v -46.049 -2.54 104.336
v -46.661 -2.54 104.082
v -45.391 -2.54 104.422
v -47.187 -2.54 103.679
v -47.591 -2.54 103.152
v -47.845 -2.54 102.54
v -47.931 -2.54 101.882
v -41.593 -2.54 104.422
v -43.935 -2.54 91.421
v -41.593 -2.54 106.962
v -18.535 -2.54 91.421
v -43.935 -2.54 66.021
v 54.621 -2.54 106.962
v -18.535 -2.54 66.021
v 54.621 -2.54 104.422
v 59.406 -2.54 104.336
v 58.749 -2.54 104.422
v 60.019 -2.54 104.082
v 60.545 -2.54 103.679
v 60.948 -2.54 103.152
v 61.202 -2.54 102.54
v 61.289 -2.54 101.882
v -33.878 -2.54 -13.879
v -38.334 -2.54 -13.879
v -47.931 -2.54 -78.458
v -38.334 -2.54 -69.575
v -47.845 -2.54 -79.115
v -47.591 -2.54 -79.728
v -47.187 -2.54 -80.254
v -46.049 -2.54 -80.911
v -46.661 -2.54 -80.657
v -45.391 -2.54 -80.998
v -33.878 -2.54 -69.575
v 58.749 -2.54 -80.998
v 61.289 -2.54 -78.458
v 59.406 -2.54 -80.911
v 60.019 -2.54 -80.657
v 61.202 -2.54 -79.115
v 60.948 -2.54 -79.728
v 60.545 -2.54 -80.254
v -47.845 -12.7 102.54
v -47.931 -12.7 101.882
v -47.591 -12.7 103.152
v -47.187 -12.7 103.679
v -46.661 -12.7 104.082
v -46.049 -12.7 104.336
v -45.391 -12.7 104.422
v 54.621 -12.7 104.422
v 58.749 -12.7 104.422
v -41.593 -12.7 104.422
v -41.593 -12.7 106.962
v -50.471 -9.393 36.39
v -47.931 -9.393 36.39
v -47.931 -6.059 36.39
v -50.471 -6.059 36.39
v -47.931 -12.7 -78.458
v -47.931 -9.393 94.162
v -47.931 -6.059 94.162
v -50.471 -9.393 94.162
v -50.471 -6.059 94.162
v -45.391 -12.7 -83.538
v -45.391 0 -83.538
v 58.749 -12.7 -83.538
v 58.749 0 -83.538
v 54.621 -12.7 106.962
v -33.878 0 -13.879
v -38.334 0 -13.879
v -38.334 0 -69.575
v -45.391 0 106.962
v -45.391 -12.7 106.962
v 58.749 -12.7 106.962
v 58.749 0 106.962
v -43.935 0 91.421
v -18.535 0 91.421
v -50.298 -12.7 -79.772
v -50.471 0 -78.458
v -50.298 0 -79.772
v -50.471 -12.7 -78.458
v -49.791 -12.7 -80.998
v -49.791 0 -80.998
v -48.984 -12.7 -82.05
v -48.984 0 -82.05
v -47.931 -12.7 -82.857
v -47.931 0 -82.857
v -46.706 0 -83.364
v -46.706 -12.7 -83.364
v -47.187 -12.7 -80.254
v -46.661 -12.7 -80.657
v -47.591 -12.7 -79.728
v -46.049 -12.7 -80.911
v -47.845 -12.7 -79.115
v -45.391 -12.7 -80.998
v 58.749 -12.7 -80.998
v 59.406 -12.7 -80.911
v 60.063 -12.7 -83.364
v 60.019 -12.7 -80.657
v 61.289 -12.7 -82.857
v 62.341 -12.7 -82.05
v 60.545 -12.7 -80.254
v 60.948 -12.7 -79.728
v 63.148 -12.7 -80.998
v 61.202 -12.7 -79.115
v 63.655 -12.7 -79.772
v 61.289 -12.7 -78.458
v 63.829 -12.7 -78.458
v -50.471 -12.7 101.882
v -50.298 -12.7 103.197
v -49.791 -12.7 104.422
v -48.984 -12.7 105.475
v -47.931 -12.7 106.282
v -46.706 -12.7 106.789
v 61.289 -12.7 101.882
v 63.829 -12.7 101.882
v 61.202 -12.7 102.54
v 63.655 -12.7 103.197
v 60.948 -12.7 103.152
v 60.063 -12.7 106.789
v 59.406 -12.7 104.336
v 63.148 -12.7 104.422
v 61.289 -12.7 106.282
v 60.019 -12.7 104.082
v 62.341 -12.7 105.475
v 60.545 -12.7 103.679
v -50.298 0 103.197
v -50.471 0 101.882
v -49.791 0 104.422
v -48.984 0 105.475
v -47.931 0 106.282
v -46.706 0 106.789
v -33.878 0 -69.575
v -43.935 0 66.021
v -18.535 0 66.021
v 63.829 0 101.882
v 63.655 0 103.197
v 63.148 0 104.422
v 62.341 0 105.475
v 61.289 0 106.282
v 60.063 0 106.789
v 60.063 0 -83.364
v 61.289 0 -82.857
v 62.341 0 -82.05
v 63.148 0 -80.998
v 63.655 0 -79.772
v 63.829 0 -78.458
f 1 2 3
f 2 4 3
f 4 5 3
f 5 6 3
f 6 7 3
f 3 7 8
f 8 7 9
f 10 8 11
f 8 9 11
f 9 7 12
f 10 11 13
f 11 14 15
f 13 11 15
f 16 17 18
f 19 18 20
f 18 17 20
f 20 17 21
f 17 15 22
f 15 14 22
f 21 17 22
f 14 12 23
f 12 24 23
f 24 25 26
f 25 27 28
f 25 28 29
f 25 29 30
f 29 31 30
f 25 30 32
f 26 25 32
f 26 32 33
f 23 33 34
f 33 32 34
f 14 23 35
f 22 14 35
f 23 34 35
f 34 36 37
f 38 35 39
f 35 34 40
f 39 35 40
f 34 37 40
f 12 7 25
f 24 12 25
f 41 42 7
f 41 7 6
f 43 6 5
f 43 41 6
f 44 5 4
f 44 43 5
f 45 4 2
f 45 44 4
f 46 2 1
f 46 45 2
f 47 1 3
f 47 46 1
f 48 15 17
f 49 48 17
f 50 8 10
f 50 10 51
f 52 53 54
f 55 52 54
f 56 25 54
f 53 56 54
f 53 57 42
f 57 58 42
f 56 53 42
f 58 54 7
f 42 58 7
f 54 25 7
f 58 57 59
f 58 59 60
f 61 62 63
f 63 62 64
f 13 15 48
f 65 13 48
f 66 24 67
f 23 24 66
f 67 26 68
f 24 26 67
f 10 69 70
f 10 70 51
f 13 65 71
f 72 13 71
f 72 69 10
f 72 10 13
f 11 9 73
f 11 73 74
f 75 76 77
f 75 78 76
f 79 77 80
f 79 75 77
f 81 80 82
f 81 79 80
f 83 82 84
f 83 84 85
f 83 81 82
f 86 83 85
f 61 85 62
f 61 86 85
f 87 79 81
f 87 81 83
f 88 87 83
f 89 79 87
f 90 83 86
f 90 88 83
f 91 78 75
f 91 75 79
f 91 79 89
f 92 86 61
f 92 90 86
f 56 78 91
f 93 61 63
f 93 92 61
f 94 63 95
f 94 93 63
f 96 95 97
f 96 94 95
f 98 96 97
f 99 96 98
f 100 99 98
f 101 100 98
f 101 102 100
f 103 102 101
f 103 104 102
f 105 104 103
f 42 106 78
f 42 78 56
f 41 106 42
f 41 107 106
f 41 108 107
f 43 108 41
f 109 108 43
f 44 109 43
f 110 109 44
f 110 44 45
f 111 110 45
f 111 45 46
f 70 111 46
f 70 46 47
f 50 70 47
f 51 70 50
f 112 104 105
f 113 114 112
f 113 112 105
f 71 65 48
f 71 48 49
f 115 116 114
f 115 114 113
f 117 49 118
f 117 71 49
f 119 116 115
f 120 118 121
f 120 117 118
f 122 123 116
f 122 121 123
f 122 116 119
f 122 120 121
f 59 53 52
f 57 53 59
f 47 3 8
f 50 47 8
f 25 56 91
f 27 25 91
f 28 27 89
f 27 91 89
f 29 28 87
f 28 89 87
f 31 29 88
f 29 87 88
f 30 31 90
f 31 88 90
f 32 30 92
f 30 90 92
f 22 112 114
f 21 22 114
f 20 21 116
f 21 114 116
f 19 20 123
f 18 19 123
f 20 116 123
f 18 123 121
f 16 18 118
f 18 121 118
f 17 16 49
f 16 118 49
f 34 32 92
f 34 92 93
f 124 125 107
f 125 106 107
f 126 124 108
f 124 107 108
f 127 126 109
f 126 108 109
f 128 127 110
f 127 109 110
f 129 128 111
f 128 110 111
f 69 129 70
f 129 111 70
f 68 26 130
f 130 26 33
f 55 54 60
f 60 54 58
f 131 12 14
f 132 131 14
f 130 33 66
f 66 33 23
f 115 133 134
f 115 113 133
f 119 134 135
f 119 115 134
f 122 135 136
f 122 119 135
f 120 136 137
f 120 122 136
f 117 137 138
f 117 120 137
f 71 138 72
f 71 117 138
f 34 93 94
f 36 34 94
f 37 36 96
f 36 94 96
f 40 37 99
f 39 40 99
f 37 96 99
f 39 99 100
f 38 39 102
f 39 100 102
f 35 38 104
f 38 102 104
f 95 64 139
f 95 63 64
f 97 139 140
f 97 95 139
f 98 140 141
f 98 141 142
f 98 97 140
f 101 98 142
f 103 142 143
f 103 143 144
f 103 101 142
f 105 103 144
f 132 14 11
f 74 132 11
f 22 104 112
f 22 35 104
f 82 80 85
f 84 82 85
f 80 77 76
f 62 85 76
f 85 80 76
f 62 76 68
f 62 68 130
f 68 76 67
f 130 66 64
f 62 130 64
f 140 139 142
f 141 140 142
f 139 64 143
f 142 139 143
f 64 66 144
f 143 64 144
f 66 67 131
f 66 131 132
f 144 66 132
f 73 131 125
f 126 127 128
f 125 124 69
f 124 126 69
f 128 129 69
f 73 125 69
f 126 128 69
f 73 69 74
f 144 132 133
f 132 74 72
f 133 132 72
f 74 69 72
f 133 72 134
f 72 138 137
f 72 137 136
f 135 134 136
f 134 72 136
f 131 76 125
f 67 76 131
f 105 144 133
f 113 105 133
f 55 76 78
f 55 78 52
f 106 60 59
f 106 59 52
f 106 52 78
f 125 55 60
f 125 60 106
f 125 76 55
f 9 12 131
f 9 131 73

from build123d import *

# Parameters (mm, degrees)
F0_W      = 114.3
F0_H      = 190.5
F1_DEPTH  = 12.7
F2_R      = 5.08
F3_T      = -2.54
F4_W      = 3.936436
F4_H      = 103.5833
F4_W_2    = 25.4
F4_H_2    = 25.4
F5_DEPTH  = 2.541
F6_W      = 3.333682
F6_H      = 57.772115
F7_DEPTH  = 2.541
F8_DEPTH  = 2.541
F9_W      = 96.21381
F9_H      = 10.16
F10_DEPTH = 2.541
F11_W     = 4.455637
F11_H     = 55.695463
F12_DEPTH = 2.541


with BuildPart() as f1:
    # F0 (on Front) → F1 (new body)
    with BuildSketch(Plane.XZ):
        with Locations((6.678557, 11.712478)):
            Rectangle(F0_W, F0_H)
    extrude(amount=F1_DEPTH)

    # F2
    f2_edges = [f1.edges().sort_by_distance(p)[0] for p in [
        (-50.471443, -6.35, 106.962478),
        (-50.471443, -6.35, -83.537522),
        (63.828557, -6.35, -83.537522),
        (63.828557, -6.35, 106.962478),
    ]]
    fillet(f2_edges, radius=F2_R)

    # F3
    f3_openings = [f1.faces().sort_by_distance(p)[0] for p in [
        (6.678557, -12.7, 11.712478),
    ]]
    offset(amount=F3_T, openings=f3_openings)

    # F4 (on face) → F5 (cut, through all)
    with BuildSketch(Plane.XZ.offset(2.54)):
        with Locations((-54.036425, 42.818326)):
            Rectangle(F4_W, F4_H)
        with Locations((-31.234852, 78.72139)):
            Rectangle(F4_W_2, F4_H_2)
    extrude(amount=-F5_DEPTH, mode=Mode.SUBTRACT)

    # F6 (on face) → F7 (cut, through all)
    with BuildSketch(Plane.YZ.offset(-47.931443)):
        with Locations((-7.72619, 65.276027)):
            Rectangle(F6_W, F6_H)
    extrude(amount=-F7_DEPTH, mode=Mode.SUBTRACT)

    # F4 (on face) → F8 (cut, through all)
    with BuildSketch(Plane.XZ.offset(2.54)):
        with Locations((-54.036425, 42.818326)):
            Rectangle(F4_W, F4_H)
        with Locations((-31.234852, 78.72139)):
            Rectangle(F4_W_2, F4_H_2)
    extrude(amount=-F8_DEPTH, mode=Mode.SUBTRACT)

    # F9 (on face) → F10 (cut, through all)
    with BuildSketch(Plane(origin=(0, 0, 104.422478), x_dir=(1, 0, 0), z_dir=(0, 0, -1))):
        with Locations((6.513808, 7.62)):
            Rectangle(F9_W, F9_H)
    extrude(amount=-F10_DEPTH, mode=Mode.SUBTRACT)

    # F11 (on face) → F12 (cut, through all)
    with BuildSketch(Plane.XZ.offset(2.54)):
        with Locations((-36.106074, -41.727004)):
            Rectangle(F11_W, F11_H)
    extrude(amount=-F12_DEPTH, mode=Mode.SUBTRACT)


solid = f1.part
